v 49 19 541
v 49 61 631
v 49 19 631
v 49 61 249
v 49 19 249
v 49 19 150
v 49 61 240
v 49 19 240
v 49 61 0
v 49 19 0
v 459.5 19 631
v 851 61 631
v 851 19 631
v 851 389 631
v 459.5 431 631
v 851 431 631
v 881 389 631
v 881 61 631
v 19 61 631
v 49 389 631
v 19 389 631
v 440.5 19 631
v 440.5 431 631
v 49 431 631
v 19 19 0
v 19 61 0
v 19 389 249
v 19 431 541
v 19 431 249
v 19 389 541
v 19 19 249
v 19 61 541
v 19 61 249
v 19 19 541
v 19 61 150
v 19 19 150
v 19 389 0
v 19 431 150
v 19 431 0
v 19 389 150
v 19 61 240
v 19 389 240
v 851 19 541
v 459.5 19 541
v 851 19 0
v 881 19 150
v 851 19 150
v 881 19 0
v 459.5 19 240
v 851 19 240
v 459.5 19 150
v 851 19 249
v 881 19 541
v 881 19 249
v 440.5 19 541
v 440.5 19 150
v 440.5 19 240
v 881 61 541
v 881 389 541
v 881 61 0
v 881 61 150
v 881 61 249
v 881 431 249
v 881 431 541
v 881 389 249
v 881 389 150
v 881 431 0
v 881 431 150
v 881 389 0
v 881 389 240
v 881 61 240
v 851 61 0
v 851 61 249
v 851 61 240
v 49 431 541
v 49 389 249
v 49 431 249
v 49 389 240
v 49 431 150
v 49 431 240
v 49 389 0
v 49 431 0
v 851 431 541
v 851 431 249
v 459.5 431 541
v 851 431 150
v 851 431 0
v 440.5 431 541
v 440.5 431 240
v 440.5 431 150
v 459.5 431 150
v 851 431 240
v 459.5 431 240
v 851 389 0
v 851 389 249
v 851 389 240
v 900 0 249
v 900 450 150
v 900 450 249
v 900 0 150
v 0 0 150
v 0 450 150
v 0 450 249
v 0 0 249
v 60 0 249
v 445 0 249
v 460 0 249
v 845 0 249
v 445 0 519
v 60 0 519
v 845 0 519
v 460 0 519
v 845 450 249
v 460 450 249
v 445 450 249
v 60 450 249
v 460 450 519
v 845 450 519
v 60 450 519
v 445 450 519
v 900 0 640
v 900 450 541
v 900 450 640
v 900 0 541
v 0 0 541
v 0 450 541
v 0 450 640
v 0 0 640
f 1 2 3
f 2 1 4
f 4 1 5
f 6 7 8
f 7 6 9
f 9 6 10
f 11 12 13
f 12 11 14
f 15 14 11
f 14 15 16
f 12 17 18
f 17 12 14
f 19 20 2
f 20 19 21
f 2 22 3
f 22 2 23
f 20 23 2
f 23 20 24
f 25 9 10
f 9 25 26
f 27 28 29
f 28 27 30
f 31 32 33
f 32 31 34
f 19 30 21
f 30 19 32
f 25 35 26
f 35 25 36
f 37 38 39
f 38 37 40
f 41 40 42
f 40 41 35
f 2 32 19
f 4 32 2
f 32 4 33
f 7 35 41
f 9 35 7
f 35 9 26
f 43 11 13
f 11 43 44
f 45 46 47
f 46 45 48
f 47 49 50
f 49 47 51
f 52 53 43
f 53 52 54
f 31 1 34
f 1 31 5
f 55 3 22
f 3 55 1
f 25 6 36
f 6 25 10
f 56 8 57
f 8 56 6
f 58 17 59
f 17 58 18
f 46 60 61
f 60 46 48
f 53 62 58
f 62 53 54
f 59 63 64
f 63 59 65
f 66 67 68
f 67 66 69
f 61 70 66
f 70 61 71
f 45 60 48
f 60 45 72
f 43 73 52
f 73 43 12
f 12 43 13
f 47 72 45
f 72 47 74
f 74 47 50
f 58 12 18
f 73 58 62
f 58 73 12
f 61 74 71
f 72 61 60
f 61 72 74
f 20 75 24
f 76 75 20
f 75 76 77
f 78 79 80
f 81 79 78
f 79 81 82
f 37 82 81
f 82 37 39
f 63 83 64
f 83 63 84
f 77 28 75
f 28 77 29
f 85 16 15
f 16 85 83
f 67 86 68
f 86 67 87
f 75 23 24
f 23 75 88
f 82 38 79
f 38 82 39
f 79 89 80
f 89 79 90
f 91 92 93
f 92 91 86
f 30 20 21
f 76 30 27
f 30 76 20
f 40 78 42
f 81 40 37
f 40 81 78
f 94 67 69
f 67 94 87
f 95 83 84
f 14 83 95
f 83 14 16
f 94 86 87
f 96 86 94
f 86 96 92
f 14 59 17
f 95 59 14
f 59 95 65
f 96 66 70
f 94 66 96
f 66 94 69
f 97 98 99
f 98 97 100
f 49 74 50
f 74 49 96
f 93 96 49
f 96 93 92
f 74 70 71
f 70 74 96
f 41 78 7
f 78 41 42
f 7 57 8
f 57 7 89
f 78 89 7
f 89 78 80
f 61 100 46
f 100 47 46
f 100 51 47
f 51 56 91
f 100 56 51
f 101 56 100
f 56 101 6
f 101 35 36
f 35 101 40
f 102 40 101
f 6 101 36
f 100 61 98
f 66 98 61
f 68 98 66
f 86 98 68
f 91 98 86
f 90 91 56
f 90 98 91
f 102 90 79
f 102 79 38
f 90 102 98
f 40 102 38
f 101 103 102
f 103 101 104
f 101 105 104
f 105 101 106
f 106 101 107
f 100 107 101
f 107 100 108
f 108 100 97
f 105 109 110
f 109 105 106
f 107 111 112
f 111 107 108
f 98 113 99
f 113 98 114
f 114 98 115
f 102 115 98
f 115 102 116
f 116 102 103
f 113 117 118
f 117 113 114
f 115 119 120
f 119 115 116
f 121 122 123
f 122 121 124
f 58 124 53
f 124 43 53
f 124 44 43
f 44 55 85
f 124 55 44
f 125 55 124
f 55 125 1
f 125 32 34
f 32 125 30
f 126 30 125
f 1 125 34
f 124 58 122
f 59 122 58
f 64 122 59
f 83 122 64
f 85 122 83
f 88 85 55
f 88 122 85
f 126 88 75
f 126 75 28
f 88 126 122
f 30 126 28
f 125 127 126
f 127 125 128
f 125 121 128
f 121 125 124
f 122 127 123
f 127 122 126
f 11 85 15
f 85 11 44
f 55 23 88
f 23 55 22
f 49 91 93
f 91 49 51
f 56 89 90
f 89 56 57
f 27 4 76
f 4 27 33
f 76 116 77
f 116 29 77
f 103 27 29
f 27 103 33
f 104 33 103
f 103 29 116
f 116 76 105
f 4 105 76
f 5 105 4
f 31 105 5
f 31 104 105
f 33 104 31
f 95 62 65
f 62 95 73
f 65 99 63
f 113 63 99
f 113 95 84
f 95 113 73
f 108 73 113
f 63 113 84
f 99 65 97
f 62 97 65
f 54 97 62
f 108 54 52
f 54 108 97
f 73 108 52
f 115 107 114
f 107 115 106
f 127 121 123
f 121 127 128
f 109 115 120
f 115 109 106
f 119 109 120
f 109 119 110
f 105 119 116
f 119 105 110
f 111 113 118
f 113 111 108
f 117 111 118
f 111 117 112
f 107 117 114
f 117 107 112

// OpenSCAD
mdf = "tan";
pine = "lemonchiffon";

function x(v) = v[0];
function y(v) = v[1];
function z(v) = v[2];

function length(v) = x(v);
function width(v)  = y(v);
function height(v) = z(v);

function mdf1() = [ 1200, 600, 12 ];
function mdf2() = [  900, 450,  9 ];

function pine1() = [ 1200, 75, 30 ];
function pine2() = [ 1200, 75, 45 ];
function pine3() = [ 1200, 90, 19 ];
function pine4() = [ 1200, 42, 19 ];
function pine5() = [ 1200, 42, 42 ];
function pine6() = [ 1200, 42, 30 ];

function cut(v,l) = [         l,  width(v), height(v) ];
function stand(v) = [ height(v),  width(v), length(v) ];
function spin(v)  = [  width(v), length(v), height(v) ];
function roll(v)  = [ length(v), height(v),  width(v) ];

clearance_z = 150;
work_z = 950;

bbox_x = 900;
bbox_y = 450;
bbox_z = 640;

function bbox000(v) = [                  0,                 0,                  0 ];
function bbox001(v) = [                  0,                 0, bbox_z - height(v) ];
function bbox010(v) = [                  0, bbox_y - width(v),                  0 ];
function bbox011(v) = [                  0, bbox_y - width(v), bbox_z - height(v) ];
function bbox100(v) = [ bbox_x - length(v),                 0,                  0 ];
function bbox101(v) = [ bbox_x - length(v),                 0, bbox_z - height(v) ];
function bbox110(v) = [ bbox_x - length(v), bbox_y - width(v),                  0 ];
function bbox111(v) = [ bbox_x - length(v), bbox_y - width(v), bbox_z - height(v) ];

module component(v, name)
{
  cube(v);
  echo(name, v);
}

function leg() = stand(cut(pine6(), bbox_z - z(surface())));
function xbeam() = roll(cut(pine3(), bbox_x));
function ybeam() = spin(roll(cut(pine3(), bbox_y - y(xbeam())*2)));
function surface() = cut(mdf2(), bbox_x);
function crate() = [ 385, 450, 270 ];


color(pine)
{
  translate(bbox000(leg()))
    translate([ x(ybeam()), y(xbeam()), 0 ])
      component(leg(), "leg front left");

  translate(bbox100(leg()))
    translate([ -x(ybeam()), y(xbeam()), 0 ])
      component(leg(), "leg front right");

  translate(bbox010(leg()))
    translate([ x(ybeam()), -y(xbeam()), 0 ])
      component(leg(), "leg back left");

  translate(bbox110(leg()))
    translate([ -x(ybeam()), -y(xbeam()), 0 ])
      component(leg(), "leg back left");

  translate(bbox000(xbeam()))
    translate([ 0, 0, clearance_z ])
      component(xbeam(), "xbeam front low");

  translate(bbox010(xbeam()))
    translate([ 0, 0, clearance_z ])
      component(xbeam(), "xbeam back low");

  translate(bbox000(ybeam()))
    translate([ 0, y(xbeam()), clearance_z ])
      component(ybeam(), "ybeam left low");

  translate(bbox100(ybeam()))
    translate([ 0, y(xbeam()), clearance_z ])
      component(ybeam(), "ybeam right low");

  translate(bbox001(xbeam()))
    translate([ 0, 0, -z(surface()) ])
      component(xbeam(), "xbeam front high");

  translate(bbox011(xbeam()))
    translate([ 0, 0, -z(surface()) ])
      component(xbeam(), "xbeam back high");

  translate(bbox001(ybeam()))
    translate([ 0, y(xbeam()), -z(surface()) ])
      component(ybeam(), "ybeam left high");

  translate(bbox101(ybeam()))
    translate([ 0, y(xbeam()), -z(surface()) ])
      component(ybeam(), "ybeam right high");


  translate(bbox001(ybeam()))
    translate([ bbox_x/2 - x(ybeam())/2, y(xbeam()), -z(surface()) ])
      component(ybeam(), "ybeam middle high");

  translate(bbox000(ybeam()))
    translate([ bbox_x/2 - x(ybeam())/2, y(xbeam()), clearance_z ])
      component(ybeam(), "ybeam middle low");

}

color(mdf)
{
  translate(bbox000(surface()))
    translate([ 0, 0, clearance_z + z(xbeam()) ])
      component(surface(), "surface low");

  translate(bbox001(surface()))
    component(surface(), "surface high");
}

color("cyan")
{
  translate(bbox000(crate()))
    translate([ 60, 0, clearance_z + z(xbeam()) + z(surface()) ])
      component(crate(), "crate1");

  translate(bbox000(crate()))
    translate([ 460, 0, clearance_z + z(xbeam()) + z(surface()) ])
      component(crate(), "crate1");
}
